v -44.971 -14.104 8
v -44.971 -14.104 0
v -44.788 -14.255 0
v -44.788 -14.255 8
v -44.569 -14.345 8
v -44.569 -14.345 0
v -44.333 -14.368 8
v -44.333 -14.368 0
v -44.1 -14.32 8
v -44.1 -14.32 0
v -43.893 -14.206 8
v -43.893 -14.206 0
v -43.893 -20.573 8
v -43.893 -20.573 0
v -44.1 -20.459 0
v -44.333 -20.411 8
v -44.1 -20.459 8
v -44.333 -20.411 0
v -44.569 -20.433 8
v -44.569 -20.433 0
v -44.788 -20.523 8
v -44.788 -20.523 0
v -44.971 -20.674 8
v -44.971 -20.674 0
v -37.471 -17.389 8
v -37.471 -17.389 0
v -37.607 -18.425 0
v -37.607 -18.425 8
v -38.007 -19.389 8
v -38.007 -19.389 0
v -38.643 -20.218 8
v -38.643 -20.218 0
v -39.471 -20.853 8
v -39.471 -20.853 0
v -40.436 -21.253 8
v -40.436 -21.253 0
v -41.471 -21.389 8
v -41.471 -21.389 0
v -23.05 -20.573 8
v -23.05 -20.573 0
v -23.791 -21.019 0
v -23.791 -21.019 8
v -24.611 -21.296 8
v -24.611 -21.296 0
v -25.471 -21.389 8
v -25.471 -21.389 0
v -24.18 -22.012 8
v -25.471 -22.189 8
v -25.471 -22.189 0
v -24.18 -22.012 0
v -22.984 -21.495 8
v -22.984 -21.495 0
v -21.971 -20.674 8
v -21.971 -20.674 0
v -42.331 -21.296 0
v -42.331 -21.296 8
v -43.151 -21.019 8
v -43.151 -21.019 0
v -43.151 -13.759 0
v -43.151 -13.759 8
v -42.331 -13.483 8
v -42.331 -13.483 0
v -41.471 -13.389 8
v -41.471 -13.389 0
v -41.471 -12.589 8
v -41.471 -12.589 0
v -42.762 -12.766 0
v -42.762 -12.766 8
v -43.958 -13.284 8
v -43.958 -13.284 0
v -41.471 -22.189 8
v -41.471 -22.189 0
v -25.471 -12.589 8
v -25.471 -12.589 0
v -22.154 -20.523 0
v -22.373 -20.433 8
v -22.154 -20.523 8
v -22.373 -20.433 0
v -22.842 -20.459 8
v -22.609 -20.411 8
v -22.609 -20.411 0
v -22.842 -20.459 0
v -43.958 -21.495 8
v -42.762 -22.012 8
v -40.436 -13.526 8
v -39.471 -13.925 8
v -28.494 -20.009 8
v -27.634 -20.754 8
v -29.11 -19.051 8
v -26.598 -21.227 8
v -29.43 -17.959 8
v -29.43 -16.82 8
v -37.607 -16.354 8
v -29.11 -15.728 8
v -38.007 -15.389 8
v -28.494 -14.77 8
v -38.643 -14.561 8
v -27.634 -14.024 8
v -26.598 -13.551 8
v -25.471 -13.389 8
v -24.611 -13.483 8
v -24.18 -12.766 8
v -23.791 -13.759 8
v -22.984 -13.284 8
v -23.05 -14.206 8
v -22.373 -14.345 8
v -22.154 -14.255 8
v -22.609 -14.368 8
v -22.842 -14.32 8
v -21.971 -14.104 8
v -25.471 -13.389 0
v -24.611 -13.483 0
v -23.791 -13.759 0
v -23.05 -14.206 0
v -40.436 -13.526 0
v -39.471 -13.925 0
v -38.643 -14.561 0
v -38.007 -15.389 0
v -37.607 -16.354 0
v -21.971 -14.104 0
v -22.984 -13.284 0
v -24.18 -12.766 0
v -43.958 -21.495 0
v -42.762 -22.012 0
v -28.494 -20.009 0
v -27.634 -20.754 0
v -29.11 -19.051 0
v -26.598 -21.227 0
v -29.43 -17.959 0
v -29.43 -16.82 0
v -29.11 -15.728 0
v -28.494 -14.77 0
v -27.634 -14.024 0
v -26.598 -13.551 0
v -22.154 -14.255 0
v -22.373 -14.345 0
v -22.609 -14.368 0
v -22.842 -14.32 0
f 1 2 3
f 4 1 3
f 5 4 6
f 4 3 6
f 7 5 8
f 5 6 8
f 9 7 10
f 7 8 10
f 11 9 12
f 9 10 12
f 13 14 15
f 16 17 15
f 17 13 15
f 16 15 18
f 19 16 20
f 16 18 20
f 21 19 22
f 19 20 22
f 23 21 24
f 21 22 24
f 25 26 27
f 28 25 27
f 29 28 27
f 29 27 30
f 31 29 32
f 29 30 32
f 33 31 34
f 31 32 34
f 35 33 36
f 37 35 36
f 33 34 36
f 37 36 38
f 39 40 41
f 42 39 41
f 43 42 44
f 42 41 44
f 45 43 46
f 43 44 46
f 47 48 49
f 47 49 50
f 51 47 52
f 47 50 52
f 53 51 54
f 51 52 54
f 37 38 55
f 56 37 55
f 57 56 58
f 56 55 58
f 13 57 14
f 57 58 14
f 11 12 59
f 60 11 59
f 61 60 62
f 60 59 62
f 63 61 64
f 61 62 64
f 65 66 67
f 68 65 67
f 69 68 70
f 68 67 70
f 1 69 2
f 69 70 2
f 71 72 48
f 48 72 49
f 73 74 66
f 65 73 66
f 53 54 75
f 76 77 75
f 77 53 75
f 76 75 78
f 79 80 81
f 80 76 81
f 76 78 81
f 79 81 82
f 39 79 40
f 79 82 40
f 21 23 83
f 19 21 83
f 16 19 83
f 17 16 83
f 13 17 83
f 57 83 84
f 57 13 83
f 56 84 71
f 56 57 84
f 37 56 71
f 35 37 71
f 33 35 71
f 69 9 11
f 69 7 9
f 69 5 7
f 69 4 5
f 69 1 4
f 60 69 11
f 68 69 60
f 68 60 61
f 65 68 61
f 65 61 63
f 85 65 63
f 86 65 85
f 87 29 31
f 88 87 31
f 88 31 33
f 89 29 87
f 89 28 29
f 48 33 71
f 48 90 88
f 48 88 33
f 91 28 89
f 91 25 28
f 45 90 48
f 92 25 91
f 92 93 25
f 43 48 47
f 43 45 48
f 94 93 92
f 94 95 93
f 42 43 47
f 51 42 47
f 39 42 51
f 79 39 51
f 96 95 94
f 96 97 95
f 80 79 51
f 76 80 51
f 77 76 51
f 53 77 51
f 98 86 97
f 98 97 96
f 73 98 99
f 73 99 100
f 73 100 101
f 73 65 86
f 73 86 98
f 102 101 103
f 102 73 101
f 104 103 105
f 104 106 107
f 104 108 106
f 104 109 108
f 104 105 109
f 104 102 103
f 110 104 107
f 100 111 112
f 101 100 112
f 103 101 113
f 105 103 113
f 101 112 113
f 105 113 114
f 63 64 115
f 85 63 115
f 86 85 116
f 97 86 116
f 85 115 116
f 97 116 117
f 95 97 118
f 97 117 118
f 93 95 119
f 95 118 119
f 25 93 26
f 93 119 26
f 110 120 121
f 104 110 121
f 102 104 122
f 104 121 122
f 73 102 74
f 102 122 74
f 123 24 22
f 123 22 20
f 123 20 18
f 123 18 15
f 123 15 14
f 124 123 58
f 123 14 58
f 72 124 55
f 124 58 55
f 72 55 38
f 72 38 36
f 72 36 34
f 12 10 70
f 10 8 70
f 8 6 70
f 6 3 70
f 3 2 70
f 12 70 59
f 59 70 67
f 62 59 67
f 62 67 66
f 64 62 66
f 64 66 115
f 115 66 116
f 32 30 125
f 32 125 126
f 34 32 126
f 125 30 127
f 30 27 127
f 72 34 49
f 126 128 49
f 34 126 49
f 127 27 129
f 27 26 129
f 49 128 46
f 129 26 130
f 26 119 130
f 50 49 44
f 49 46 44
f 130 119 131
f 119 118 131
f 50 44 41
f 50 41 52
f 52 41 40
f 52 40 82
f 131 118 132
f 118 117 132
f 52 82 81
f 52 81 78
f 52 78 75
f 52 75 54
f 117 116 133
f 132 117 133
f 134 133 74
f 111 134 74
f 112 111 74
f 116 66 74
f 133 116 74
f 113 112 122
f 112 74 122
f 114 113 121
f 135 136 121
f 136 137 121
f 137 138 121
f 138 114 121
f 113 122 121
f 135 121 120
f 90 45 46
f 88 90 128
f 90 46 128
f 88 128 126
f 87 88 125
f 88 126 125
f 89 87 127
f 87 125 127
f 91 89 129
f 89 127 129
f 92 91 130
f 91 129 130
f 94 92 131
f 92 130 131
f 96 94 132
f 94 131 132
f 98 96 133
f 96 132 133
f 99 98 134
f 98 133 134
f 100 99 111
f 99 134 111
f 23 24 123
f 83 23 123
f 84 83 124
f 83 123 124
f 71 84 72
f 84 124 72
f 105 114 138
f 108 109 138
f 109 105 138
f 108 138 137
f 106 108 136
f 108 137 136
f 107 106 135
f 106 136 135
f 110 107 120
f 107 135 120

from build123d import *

# Parameters (mm, degrees)
EXTRUDE_1_DEPTH = 8
FILLET_1_R      = 0.8


with BuildPart() as part:
    # 草图1 → 凸台-拉伸1 (new body)
    with BuildSketch(Plane.XY):
        with BuildLine():
            Line((-25.471055476, -12.589310126), (-41.471055476, -12.589310126))
            ThreePointArc((-41.471055476, -12.589310126), (-38.076942926, -13.995197576), (-36.671055476, -17.389310126))
            ThreePointArc((-36.671055476, -17.389310126), (-38.076942926, -20.783422675), (-41.471055476, -22.189310126))
            Line((-41.471055476, -22.189310126), (-25.471055476, -22.189310126))
            ThreePointArc((-25.471055476, -22.189310126), (-30.271055476, -17.389310126), (-25.471055476, -12.589310126))
        make_face()
        with BuildLine():
            ThreePointArc((-36.671055476, -17.389310126), (-38.076942926, -13.995197576), (-41.471055476, -12.589310126))
            Line((-41.471055476, -12.589310126), (-41.471055476, -13.389310126))
            ThreePointArc((-41.471055476, -13.389310126), (-38.642628351, -14.560883001), (-37.471055476, -17.389310126))
            ThreePointArc((-37.471055476, -17.389310126), (-38.642628351, -20.21773725), (-41.471055476, -21.389310126))
            Line((-41.471055476, -21.389310126), (-41.471055476, -22.189310126))
            ThreePointArc((-41.471055476, -22.189310126), (-38.076942926, -20.783422675), (-36.671055476, -17.389310126))
        make_face()
        with BuildLine():
            Line((-25.471055476, -13.389310126), (-25.471055476, -12.589310126))
            ThreePointArc((-25.471055476, -12.589310126), (-30.271055476, -17.389310126), (-25.471055476, -22.189310126))
            Line((-25.471055476, -22.189310126), (-25.471055476, -21.389310126))
            ThreePointArc((-25.471055476, -21.389310126), (-29.471055476, -17.389310126), (-25.471055476, -13.389310126))
        make_face()
        with BuildLine():
            ThreePointArc((-21.971055476, -14.104496584), (-23.564108308, -12.984363758), (-25.471055476, -12.589310126))
            Line((-25.471055476, -12.589310126), (-25.471055476, -13.389310126))
            ThreePointArc((-25.471055476, -13.389310126), (-23.43954947, -13.943590557), (-21.971055476, -15.452818452))
            Line((-21.971055476, -15.452818452), (-21.971055476, -14.104496584))
        make_face()
        with BuildLine():
            Line((-25.471055476, -21.389310126), (-25.471055476, -22.189310126))
            ThreePointArc((-25.471055476, -22.189310126), (-23.564108308, -21.794256493), (-21.971055476, -20.674123667))
            Line((-21.971055476, -20.674123667), (-21.971055476, -19.325801799))
            ThreePointArc((-21.971055476, -19.325801799), (-23.43954947, -20.835029694), (-25.471055476, -21.389310126))
        make_face()
        with BuildLine():
            ThreePointArc((-21.971055476, -14.104496584), (-23.564108308, -12.984363758), (-25.471055476, -12.589310126))
            Line((-25.471055476, -12.589310126), (-25.471055476, -13.389310126))
            ThreePointArc((-25.471055476, -13.389310126), (-23.43954947, -13.943590557), (-21.971055476, -15.452818452))
            Line((-21.971055476, -15.452818452), (-21.971055476, -14.104496584))
        make_face()
        with BuildLine():
            Line((-25.471055476, -21.389310126), (-25.471055476, -22.189310126))
            ThreePointArc((-25.471055476, -22.189310126), (-23.564108308, -21.794256493), (-21.971055476, -20.674123667))
            Line((-21.971055476, -20.674123667), (-21.971055476, -19.325801799))
            ThreePointArc((-21.971055476, -19.325801799), (-23.43954947, -20.835029694), (-25.471055476, -21.389310126))
        make_face()
        with BuildLine():
            Line((-41.471055476, -13.389310126), (-41.471055476, -12.589310126))
            ThreePointArc((-41.471055476, -12.589310126), (-43.378002644, -12.984363758), (-44.971055476, -14.104496584))
            Line((-44.971055476, -14.104496584), (-44.971055476, -15.452818452))
            ThreePointArc((-44.971055476, -15.452818452), (-43.502561482, -13.943590557), (-41.471055476, -13.389310126))
        make_face()
        with BuildLine():
            Line((-41.471055476, -22.189310126), (-41.471055476, -21.389310126))
            ThreePointArc((-41.471055476, -21.389310126), (-43.502561482, -20.835029694), (-44.971055476, -19.325801799))
            Line((-44.971055476, -19.325801799), (-44.971055476, -20.674123667))
            ThreePointArc((-44.971055476, -20.674123667), (-43.378002644, -21.794256493), (-41.471055476, -22.189310126))
        make_face()
        with BuildLine():
            Line((-41.471055476, -13.389310126), (-41.471055476, -12.589310126))
            ThreePointArc((-41.471055476, -12.589310126), (-43.378002644, -12.984363758), (-44.971055476, -14.104496584))
            Line((-44.971055476, -14.104496584), (-44.971055476, -15.452818452))
            ThreePointArc((-44.971055476, -15.452818452), (-43.502561482, -13.943590557), (-41.471055476, -13.389310126))
        make_face()
        with BuildLine():
            Line((-41.471055476, -22.189310126), (-41.471055476, -21.389310126))
            ThreePointArc((-41.471055476, -21.389310126), (-43.502561482, -20.835029694), (-44.971055476, -19.325801799))
            Line((-44.971055476, -19.325801799), (-44.971055476, -20.674123667))
            ThreePointArc((-44.971055476, -20.674123667), (-43.378002644, -21.794256493), (-41.471055476, -22.189310126))
        make_face()
    extrude(amount=EXTRUDE_1_DEPTH)

    # 圆角1
    # the kernel refuses this fillet: 0.8 mm, written as the material it takes off along each edge
    with BuildSketch(Plane(origin=(-21.971055476, -15.452818452, -4.122167705), x_dir=(0, 1, 0), z_dir=(0, 0, 1)), Plane(origin=(-44.971055476, -19.325801799, -4.122167705), x_dir=(0, -1, 0), z_dir=(0, 0, 1))) as fillet_1_piece_1:
        with BuildLine():
            CenterArc((1.884003799, 0.594175789), FILLET_1_R, 142.743805491, 85.219808153)
            Line((1.247254554, 1.078479824), (1.234519569, 1.088165905))
            ThreePointArc((1.234519569, 1.088165905), (0.66933609, 0.486377982), (-0.007745967, 0.014))
            Line((-0.007745967, 0.014), (0, -0.016))
            ThreePointArc((0, -0.016), (0.674160934, -0.016), (1.337608229, -0.011883516))
            Line((1.337608229, -0.011883516), (1.348321868, 0))
        make_face()
    extrude(amount=16.24433541, mode=Mode.SUBTRACT)
    with BuildSketch(Plane(origin=(-21.971055476, -19.325801799, -4.122167705), x_dir=(-0.6540732337391989, -0.7564312294623664, 0), z_dir=(0, 0, 1))) as fillet_1_piece_2:
        with BuildLine():
            CenterArc((1.81375379, 0.782823335), FILLET_1_R, 172.885801288, 85.219808153)
            Line((1.019912768, 0.881901244), (1.004035948, 0.883882803))
            ThreePointArc((1.004035948, 0.883882803), (0.499491212, 0.453053522), (-0.010465172, 0.0121029))
            Line((-0.010465172, 0.0121029), (0.003297734, -0.015656467))
            ThreePointArc((0.003297734, -0.015656467), (0.824433541, 0.069883326), (1.645569348, -0.015656467))
            Line((1.645569348, -0.015656467), (1.648867082, 0))
        make_face()
    extrude(amount=16.24433541, mode=Mode.SUBTRACT)
    with BuildSketch(Plane(origin=(-44.971055476, -15.452818452, -4.122167705), x_dir=(0, 1, 0), z_dir=(0, 0, 1))) as fillet_1_piece_3:
        with BuildLine():
            CenterArc((1.884003799, -0.594175789), FILLET_1_R, 132.036386357, 85.219808153)
            Line((1.247254554, -1.078479824), (1.234519569, -1.088165905))
            ThreePointArc((1.234519569, -1.088165905), (0.66933609, -0.486377982), (-0.007745967, -0.014))
            Line((-0.007745967, -0.014), (0, 0.016))
            ThreePointArc((0, 0.016), (0.674160934, 0.016), (1.337608229, 0.011883516))
            Line((1.337608229, 0.011883516), (1.348321868, 0))
        make_face()
    extrude(amount=16.24433541, mode=Mode.SUBTRACT)


solid = part.part
